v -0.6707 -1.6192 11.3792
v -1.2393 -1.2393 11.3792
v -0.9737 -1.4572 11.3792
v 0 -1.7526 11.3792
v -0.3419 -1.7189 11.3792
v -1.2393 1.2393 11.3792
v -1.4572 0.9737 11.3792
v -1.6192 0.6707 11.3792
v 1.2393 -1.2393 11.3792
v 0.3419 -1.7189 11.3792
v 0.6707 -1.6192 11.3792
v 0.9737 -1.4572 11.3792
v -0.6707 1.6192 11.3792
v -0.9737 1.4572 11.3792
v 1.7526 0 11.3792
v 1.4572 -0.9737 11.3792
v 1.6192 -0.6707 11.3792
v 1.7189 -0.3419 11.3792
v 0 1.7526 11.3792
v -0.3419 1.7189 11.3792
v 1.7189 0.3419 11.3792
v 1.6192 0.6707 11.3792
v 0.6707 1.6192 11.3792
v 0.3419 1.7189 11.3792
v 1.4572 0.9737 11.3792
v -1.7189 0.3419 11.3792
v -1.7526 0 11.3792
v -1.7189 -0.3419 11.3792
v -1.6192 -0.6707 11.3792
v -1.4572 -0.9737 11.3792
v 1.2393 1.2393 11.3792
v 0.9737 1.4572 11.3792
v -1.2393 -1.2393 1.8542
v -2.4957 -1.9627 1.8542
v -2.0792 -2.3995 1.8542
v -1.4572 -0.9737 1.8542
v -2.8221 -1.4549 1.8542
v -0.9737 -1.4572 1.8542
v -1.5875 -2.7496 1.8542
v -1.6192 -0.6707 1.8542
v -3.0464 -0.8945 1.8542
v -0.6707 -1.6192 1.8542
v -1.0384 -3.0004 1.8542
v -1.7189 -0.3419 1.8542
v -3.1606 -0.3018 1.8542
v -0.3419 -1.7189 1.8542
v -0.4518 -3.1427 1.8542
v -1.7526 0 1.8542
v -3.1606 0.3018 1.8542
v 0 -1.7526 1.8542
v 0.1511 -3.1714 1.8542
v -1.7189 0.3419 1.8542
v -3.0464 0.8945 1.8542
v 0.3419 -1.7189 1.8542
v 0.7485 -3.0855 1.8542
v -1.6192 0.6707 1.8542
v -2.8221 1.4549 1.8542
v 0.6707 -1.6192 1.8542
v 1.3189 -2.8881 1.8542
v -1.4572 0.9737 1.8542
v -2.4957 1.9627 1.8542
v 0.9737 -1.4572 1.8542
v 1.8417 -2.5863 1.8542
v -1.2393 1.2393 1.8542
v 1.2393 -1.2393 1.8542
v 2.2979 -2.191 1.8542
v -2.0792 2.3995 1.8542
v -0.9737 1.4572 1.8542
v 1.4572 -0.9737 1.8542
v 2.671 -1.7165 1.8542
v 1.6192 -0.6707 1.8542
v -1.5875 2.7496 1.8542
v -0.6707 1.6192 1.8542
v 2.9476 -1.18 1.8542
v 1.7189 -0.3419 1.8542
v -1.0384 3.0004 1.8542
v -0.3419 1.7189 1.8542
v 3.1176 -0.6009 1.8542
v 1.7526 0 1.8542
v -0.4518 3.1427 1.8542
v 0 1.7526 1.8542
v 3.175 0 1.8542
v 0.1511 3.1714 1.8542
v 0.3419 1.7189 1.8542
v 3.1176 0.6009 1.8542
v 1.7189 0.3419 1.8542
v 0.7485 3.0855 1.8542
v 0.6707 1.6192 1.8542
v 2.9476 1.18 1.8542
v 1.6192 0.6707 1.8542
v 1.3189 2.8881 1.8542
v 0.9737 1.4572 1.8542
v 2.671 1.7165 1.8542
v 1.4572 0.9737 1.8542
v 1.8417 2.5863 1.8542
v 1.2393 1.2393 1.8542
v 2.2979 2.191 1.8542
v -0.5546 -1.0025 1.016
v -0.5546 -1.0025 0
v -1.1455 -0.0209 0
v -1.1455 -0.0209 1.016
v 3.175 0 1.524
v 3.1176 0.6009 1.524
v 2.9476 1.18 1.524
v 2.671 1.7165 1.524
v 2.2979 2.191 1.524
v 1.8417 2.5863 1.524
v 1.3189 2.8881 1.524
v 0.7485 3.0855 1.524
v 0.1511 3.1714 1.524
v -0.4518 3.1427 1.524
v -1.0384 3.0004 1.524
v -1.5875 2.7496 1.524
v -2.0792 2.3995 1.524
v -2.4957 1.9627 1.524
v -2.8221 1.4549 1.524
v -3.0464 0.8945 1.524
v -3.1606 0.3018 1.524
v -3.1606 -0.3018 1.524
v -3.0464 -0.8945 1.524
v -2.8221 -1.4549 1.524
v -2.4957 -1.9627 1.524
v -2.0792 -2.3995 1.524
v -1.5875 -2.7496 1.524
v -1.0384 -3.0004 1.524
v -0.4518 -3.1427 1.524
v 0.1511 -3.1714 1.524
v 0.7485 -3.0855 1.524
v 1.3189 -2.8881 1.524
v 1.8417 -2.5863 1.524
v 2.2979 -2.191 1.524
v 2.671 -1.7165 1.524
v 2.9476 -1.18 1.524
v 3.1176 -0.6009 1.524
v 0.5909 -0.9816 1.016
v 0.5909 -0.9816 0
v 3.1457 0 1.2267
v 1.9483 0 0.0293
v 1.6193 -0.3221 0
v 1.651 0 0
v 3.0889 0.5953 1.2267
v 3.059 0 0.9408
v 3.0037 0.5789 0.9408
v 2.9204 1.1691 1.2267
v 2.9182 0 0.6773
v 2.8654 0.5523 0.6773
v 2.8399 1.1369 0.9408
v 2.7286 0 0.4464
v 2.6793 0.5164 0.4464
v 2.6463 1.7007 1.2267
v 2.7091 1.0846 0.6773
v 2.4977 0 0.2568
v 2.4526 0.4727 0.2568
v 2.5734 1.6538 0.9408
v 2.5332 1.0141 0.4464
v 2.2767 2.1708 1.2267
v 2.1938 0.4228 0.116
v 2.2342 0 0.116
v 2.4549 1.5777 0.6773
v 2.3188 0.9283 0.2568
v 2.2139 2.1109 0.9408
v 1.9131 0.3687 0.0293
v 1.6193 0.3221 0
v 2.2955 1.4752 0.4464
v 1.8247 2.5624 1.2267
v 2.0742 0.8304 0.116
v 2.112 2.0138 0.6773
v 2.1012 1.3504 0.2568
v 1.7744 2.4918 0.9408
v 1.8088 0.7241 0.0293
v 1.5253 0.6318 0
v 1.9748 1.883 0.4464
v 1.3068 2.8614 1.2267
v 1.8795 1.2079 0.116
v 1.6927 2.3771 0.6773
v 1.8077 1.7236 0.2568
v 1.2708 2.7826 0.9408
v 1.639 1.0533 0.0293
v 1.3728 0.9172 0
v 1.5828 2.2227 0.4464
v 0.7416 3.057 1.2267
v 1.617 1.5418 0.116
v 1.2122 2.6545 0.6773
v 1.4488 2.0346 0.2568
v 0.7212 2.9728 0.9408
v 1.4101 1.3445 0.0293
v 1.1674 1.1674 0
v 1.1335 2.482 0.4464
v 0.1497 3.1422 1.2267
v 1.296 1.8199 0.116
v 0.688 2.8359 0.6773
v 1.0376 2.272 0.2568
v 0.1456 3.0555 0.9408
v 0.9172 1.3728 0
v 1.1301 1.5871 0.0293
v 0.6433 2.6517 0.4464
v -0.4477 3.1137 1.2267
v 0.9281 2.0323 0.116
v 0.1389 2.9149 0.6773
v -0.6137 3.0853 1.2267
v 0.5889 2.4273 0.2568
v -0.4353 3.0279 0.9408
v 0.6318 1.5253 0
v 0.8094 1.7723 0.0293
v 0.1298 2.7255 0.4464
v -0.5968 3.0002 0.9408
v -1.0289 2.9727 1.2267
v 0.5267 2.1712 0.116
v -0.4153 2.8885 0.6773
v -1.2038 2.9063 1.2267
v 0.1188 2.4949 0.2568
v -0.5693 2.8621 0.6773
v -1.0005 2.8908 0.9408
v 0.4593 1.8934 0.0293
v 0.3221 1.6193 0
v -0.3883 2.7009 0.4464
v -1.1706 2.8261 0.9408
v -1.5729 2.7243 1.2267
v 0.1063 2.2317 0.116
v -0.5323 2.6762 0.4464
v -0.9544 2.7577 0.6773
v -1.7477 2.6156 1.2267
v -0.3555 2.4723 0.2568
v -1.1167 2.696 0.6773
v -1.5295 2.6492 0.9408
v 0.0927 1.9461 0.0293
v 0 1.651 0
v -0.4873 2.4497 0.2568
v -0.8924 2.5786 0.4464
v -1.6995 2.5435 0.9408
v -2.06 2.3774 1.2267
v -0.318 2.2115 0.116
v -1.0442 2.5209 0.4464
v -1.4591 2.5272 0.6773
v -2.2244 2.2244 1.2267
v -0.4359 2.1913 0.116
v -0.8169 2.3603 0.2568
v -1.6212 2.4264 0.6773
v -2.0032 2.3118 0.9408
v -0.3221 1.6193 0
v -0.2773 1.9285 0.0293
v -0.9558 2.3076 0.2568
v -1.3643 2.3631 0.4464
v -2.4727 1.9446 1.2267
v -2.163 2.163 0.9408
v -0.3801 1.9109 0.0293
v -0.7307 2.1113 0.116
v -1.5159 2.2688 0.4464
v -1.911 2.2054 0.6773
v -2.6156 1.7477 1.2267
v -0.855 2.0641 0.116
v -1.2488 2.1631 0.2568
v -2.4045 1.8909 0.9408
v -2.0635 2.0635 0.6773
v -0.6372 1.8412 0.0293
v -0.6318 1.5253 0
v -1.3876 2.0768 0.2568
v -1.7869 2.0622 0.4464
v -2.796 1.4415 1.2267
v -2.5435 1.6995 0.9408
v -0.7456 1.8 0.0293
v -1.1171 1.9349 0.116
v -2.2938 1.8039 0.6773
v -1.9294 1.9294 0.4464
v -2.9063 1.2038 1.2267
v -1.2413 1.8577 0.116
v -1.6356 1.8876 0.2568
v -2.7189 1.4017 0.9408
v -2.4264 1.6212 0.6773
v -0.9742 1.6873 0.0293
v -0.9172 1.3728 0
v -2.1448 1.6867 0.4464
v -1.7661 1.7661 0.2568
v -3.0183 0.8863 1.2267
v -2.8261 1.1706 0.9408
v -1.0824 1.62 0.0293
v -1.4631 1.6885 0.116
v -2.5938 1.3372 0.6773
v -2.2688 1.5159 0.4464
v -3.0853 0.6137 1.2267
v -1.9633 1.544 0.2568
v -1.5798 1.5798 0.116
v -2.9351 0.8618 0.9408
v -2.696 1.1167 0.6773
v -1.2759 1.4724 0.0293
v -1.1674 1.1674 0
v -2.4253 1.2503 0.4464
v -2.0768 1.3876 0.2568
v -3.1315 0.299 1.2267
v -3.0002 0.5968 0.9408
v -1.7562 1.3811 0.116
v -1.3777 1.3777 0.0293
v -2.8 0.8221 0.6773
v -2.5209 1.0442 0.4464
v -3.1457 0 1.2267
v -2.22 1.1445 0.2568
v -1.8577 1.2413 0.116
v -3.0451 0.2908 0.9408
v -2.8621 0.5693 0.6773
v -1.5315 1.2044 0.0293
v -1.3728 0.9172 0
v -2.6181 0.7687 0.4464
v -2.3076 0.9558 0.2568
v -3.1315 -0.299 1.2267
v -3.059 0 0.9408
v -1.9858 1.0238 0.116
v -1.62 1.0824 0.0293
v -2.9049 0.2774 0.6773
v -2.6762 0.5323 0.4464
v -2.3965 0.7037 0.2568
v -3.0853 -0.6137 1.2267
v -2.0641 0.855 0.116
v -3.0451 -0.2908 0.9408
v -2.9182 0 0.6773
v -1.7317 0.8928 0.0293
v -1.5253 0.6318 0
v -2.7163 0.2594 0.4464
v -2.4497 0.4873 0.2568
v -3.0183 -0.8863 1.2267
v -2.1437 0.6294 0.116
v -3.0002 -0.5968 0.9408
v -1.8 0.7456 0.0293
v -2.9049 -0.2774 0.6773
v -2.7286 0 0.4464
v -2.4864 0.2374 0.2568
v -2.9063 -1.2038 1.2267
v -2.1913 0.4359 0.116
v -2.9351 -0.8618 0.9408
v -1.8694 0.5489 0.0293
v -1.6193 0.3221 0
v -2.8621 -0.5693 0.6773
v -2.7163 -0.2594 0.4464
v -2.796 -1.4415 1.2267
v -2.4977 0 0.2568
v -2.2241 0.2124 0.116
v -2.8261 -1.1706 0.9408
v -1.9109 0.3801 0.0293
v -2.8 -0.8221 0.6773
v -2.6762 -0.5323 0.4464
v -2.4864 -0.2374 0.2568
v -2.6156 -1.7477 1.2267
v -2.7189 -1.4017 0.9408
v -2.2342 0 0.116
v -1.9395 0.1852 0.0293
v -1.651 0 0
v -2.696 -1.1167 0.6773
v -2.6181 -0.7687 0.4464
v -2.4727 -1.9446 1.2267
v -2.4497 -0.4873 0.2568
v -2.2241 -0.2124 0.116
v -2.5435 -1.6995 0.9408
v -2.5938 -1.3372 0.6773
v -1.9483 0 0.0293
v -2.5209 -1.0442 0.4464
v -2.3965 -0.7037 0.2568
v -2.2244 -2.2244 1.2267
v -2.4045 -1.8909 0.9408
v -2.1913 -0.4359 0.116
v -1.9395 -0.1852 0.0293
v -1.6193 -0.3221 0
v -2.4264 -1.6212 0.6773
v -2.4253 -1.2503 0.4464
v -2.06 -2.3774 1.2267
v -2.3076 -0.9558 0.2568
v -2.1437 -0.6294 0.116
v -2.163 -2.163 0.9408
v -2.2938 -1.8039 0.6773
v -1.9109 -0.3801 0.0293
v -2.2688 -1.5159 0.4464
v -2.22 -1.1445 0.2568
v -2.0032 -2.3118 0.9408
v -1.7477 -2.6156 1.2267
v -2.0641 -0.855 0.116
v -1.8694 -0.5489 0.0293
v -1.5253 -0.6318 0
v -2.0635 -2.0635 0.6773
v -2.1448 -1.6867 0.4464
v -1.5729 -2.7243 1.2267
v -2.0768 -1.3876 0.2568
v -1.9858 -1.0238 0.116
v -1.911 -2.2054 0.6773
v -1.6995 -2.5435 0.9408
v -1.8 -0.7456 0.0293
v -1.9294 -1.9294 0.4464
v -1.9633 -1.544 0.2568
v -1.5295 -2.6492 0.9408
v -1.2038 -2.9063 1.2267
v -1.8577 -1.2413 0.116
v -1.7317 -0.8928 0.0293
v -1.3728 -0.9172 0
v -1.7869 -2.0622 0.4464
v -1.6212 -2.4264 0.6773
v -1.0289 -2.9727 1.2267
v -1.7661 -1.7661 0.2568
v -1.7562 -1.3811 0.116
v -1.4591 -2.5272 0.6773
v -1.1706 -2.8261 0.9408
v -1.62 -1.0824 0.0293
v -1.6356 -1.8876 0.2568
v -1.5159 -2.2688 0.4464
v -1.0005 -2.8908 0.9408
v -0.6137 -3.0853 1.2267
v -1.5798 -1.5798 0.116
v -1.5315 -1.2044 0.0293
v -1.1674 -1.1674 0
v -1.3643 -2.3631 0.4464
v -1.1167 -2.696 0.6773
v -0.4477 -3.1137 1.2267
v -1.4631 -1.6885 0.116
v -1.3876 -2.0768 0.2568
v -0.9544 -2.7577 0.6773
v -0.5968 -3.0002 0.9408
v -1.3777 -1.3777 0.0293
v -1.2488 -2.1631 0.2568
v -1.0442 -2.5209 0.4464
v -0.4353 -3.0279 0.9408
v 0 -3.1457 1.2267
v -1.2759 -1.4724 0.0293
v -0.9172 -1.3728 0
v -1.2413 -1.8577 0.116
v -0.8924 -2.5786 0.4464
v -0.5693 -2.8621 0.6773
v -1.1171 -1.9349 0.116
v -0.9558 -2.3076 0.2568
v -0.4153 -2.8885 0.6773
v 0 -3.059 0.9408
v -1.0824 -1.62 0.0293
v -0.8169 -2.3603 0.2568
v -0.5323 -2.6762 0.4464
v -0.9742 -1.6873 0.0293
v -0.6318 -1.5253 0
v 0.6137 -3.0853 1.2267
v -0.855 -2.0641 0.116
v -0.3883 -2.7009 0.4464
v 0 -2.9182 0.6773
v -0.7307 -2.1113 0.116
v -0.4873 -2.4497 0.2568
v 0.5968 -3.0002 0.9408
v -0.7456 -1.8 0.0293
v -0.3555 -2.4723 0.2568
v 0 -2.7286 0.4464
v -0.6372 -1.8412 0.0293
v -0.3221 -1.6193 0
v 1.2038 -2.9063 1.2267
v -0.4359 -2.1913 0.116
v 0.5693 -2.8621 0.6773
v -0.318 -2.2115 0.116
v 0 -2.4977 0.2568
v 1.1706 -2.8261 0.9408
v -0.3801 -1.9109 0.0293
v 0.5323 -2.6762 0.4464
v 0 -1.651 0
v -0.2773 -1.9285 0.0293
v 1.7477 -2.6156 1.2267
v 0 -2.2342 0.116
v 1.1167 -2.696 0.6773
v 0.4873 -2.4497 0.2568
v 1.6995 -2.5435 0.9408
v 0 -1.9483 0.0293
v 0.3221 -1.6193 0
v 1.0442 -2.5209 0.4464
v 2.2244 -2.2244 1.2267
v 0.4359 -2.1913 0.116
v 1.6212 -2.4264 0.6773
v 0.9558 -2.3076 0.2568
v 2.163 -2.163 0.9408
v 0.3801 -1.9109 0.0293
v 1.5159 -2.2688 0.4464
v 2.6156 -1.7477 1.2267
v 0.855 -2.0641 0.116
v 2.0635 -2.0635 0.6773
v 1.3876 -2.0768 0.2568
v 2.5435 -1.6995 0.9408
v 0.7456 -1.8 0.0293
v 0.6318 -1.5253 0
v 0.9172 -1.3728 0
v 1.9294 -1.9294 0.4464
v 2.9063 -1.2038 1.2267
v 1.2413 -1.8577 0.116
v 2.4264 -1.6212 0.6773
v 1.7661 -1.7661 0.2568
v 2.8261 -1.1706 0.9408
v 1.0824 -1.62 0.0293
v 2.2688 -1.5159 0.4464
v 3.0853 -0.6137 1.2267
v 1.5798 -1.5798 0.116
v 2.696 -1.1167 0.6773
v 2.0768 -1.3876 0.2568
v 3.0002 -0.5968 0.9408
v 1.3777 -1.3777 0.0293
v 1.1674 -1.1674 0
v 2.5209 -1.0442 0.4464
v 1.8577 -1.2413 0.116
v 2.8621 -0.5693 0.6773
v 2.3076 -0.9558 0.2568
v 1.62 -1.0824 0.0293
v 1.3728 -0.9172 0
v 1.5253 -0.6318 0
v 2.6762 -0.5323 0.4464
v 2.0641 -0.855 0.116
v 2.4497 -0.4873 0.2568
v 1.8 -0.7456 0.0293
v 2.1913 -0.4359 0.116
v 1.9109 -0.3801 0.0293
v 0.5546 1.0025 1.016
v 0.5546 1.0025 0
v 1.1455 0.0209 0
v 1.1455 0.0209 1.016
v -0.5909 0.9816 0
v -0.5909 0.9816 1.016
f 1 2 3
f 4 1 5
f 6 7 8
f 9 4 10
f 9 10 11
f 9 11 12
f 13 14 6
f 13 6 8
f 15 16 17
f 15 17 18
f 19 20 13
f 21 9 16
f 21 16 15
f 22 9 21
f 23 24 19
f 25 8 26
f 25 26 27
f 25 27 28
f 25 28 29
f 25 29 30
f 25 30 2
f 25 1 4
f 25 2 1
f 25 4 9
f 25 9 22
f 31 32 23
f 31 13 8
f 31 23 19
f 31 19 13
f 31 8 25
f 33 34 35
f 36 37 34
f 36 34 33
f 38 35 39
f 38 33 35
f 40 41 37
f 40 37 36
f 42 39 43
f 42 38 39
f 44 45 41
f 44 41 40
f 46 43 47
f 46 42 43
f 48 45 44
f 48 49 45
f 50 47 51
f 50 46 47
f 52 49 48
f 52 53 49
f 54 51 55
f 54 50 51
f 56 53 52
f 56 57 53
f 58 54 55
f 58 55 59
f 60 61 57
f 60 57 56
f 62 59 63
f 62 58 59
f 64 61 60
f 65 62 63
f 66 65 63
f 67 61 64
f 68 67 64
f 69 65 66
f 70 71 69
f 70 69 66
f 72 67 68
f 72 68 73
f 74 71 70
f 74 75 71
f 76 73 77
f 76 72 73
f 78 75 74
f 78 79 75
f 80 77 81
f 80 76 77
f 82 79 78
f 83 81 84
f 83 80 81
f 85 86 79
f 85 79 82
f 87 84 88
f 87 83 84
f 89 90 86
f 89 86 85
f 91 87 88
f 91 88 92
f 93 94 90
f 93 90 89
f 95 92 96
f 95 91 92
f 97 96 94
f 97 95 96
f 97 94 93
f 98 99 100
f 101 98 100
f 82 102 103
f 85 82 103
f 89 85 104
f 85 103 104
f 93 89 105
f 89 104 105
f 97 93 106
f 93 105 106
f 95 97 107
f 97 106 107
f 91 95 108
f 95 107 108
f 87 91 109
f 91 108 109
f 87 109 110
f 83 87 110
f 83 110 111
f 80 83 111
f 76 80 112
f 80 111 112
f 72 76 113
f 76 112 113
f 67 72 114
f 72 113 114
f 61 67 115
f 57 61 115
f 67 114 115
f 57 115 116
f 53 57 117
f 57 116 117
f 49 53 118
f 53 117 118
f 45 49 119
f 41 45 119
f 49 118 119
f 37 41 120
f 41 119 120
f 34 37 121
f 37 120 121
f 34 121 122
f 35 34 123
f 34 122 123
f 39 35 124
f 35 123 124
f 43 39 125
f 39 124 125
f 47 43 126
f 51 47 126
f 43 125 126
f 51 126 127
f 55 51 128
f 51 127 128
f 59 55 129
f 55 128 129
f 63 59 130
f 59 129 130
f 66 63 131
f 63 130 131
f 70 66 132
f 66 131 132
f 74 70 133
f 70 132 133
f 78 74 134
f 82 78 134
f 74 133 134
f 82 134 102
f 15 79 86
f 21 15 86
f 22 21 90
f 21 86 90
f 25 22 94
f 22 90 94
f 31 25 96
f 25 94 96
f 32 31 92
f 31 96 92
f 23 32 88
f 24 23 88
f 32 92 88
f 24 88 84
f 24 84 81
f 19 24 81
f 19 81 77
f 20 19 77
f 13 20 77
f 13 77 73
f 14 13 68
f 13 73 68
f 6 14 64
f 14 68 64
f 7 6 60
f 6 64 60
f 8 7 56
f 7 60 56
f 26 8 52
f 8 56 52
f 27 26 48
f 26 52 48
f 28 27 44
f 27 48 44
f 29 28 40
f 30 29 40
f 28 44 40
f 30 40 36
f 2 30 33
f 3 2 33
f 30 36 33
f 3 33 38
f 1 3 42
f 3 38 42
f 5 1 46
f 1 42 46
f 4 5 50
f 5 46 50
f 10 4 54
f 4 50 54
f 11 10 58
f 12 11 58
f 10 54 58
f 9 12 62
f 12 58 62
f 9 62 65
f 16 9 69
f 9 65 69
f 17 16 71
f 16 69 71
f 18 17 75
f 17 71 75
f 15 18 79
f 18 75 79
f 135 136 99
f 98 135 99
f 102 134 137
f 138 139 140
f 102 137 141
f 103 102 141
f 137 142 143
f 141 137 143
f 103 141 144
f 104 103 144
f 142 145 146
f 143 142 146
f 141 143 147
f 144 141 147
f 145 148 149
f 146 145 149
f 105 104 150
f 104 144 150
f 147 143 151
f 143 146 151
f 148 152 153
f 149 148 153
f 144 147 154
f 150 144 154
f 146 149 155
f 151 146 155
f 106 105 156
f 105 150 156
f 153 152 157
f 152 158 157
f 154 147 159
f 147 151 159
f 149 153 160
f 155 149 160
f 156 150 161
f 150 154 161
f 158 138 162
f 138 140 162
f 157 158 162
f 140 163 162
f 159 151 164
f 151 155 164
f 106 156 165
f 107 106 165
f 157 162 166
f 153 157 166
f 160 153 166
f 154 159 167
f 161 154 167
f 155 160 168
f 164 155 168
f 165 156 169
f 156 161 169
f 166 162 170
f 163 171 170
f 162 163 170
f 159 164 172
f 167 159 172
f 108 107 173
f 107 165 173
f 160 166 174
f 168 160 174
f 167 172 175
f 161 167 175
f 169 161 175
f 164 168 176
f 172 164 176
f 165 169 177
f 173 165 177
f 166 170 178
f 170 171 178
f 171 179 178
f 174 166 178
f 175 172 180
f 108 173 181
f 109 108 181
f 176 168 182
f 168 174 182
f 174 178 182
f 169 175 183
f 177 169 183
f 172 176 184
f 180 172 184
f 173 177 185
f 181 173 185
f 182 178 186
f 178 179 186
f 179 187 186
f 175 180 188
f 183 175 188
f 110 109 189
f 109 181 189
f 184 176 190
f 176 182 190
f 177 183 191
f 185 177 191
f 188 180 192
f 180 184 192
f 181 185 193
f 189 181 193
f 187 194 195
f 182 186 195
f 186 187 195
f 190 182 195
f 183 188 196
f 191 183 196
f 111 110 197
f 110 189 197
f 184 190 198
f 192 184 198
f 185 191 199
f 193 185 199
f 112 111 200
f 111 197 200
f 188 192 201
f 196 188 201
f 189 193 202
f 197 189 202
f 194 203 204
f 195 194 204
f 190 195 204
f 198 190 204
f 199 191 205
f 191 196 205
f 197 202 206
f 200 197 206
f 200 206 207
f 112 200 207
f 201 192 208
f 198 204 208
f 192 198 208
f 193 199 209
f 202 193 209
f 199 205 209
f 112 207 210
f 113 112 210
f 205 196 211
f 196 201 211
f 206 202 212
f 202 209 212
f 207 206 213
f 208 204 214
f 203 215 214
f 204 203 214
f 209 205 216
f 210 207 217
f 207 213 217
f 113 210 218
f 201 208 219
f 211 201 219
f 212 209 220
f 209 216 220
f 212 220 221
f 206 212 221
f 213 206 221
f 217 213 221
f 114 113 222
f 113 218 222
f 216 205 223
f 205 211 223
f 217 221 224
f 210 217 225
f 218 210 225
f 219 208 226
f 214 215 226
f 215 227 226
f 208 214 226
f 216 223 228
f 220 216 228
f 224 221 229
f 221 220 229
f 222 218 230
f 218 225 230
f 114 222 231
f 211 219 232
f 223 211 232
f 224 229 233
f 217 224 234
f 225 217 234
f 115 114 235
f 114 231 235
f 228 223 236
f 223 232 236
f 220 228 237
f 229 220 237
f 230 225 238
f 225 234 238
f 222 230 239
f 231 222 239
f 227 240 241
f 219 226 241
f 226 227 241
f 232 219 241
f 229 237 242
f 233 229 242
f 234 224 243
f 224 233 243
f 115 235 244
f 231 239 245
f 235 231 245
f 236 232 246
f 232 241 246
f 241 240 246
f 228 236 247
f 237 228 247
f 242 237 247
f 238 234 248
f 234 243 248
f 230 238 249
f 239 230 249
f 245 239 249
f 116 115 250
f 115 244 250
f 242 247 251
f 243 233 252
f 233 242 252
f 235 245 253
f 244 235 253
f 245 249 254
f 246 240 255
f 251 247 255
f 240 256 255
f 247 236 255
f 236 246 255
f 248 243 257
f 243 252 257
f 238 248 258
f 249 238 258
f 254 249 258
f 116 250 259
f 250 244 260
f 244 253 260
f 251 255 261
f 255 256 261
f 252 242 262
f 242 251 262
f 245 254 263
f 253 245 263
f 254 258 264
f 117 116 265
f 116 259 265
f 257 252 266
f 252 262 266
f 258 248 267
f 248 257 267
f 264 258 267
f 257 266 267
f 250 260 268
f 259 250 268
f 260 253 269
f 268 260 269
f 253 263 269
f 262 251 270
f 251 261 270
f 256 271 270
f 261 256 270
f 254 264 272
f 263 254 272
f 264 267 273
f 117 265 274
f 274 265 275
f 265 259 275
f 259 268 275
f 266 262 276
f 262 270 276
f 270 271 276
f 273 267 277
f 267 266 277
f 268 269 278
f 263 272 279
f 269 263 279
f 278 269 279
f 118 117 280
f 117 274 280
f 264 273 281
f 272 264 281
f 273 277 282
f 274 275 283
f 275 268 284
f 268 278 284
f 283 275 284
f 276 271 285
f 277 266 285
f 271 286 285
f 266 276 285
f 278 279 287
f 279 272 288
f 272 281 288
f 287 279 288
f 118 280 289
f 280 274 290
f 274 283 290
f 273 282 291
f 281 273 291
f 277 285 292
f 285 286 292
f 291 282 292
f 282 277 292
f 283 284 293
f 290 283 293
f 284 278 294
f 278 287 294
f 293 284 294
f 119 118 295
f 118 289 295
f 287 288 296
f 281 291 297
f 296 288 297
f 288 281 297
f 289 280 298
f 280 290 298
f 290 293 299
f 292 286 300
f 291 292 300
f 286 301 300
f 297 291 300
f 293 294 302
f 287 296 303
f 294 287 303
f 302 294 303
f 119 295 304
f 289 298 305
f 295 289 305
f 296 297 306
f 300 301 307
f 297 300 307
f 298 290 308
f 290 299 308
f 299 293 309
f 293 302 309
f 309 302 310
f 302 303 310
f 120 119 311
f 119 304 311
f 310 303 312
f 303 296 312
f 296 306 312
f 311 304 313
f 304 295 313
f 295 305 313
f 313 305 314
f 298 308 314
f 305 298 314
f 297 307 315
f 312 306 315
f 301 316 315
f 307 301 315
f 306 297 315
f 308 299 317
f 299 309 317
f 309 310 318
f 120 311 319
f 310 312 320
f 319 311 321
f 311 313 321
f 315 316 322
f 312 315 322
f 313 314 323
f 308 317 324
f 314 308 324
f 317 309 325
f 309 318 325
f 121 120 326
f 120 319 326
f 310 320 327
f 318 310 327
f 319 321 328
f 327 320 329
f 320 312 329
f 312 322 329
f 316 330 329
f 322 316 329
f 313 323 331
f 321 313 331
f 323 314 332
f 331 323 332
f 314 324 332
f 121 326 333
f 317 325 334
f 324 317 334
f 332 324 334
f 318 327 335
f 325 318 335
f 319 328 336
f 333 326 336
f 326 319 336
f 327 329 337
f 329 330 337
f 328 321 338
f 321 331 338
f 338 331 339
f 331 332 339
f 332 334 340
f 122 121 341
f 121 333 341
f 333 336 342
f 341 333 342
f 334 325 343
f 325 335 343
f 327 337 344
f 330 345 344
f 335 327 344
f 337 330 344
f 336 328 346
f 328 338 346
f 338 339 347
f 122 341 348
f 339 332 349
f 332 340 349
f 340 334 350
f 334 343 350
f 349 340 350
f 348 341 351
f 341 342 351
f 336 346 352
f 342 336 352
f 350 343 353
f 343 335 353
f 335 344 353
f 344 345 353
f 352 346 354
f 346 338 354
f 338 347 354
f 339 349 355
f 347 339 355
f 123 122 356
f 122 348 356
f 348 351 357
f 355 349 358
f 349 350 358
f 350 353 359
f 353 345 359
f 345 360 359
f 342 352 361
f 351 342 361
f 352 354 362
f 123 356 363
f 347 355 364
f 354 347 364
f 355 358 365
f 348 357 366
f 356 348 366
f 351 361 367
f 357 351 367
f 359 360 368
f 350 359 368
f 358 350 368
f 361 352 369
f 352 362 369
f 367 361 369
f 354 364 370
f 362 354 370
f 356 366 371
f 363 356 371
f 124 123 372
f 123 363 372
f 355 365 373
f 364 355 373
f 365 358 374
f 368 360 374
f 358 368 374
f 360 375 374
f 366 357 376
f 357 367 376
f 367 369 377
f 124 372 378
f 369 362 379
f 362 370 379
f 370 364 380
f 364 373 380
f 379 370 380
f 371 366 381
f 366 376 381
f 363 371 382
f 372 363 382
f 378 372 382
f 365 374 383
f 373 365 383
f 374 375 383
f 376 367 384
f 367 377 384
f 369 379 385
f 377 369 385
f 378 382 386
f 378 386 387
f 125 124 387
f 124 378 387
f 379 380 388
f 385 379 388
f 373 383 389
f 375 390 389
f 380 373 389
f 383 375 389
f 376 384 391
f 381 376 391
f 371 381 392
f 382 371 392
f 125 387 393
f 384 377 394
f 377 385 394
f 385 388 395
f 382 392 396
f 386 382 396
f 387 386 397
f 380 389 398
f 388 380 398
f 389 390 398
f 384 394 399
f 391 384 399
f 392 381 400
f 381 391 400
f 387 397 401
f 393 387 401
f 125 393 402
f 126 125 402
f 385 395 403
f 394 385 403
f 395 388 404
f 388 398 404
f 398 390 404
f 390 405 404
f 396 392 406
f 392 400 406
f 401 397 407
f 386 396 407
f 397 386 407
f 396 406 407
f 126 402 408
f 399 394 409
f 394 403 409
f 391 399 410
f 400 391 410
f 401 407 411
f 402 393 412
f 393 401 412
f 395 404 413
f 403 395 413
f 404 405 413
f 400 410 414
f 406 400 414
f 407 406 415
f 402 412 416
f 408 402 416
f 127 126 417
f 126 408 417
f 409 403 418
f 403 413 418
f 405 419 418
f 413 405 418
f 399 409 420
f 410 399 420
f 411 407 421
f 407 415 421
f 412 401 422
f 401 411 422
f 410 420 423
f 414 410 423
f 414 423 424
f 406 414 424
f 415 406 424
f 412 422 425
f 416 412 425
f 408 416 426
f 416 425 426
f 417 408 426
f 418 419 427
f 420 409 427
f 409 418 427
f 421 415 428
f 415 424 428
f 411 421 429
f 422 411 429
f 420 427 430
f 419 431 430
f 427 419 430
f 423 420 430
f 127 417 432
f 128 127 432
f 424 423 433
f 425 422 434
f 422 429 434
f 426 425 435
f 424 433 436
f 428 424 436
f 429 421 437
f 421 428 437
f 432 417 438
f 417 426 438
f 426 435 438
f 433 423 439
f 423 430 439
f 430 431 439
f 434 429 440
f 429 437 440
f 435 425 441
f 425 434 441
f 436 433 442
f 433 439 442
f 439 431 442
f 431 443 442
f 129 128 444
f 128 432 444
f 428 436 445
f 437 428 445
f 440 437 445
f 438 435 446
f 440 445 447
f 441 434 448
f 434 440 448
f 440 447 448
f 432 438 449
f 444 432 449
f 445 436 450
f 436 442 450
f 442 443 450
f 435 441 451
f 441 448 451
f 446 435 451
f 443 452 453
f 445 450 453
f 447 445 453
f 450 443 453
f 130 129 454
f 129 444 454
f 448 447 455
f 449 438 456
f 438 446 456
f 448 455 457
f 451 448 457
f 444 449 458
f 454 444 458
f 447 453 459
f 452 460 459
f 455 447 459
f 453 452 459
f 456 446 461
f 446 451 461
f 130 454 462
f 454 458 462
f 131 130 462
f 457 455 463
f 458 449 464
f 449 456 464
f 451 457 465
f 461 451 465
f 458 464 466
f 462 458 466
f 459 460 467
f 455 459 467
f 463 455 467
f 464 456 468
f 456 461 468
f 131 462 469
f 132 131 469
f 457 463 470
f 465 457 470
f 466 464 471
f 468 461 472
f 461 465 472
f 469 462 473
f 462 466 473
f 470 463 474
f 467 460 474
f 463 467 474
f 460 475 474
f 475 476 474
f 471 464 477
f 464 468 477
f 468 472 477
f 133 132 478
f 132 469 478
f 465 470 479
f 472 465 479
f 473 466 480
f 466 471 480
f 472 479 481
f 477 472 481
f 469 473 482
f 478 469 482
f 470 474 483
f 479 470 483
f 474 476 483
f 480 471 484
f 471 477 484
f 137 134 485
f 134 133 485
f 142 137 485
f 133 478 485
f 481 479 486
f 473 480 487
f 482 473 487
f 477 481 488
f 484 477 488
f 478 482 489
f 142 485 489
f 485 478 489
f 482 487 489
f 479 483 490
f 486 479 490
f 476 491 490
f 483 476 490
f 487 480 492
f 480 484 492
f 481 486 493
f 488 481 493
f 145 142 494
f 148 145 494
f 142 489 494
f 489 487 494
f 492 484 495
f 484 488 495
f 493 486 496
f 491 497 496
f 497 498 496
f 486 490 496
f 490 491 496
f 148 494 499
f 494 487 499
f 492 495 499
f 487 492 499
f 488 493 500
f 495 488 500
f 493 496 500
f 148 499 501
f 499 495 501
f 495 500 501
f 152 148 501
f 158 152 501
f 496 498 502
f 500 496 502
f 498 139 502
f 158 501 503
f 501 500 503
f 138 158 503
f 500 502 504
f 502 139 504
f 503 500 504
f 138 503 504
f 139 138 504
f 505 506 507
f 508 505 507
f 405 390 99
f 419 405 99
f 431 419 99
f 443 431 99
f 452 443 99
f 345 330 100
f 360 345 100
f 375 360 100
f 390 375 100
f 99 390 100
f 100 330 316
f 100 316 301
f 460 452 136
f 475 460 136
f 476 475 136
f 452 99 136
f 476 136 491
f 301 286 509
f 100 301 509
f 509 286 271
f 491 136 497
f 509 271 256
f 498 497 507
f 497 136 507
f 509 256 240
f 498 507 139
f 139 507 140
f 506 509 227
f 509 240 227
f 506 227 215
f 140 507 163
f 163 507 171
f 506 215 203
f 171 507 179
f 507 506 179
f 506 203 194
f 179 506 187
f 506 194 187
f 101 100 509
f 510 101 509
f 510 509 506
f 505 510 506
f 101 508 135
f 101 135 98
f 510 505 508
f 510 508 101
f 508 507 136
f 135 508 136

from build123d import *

# Parameters (mm, degrees)
SKETCH1_R      = 3.175
EXTRUDE1_DEPTH = 1.8542
FILLET1_R      = 1.524
SKETCH2_R      = 1.7526
EXTRUDE2_DEPTH = 9.525
EXTRUDE3_DEPTH = 1.016


with BuildPart() as part:
    # Sketch1 → Extrude1 (new body)
    with BuildSketch(Plane.XY):
        Circle(SKETCH1_R)
    extrude(amount=EXTRUDE1_DEPTH)

    # Fillet1
    fillet1_edges = [part.edges().sort_by_distance(p)[0] for p in [
        (-3.175, 0, 0),
    ]]
    fillet(fillet1_edges, radius=FILLET1_R)

    # Sketch2 → Extrude2 (add)
    with BuildSketch(Plane.XY.offset(1.8542)):
        Circle(SKETCH2_R)
    extrude(amount=EXTRUDE2_DEPTH)

    # Sketch3 → Extrude3 (cut)
    with BuildSketch(Plane(origin=(0, 0, 0), x_dir=(-1, 0, 0), z_dir=(0, 0, -1))):
        Polygon((0.59085384, 0.981566666), (-0.554634748, 1.002477769), (-1.145488588, 0.020911103), (-0.59085384, -0.981566666), (0.554634748, -1.002477769), (1.145488588, -0.020911103), align=None)
    extrude(amount=-EXTRUDE3_DEPTH, mode=Mode.SUBTRACT)


solid = part.part
